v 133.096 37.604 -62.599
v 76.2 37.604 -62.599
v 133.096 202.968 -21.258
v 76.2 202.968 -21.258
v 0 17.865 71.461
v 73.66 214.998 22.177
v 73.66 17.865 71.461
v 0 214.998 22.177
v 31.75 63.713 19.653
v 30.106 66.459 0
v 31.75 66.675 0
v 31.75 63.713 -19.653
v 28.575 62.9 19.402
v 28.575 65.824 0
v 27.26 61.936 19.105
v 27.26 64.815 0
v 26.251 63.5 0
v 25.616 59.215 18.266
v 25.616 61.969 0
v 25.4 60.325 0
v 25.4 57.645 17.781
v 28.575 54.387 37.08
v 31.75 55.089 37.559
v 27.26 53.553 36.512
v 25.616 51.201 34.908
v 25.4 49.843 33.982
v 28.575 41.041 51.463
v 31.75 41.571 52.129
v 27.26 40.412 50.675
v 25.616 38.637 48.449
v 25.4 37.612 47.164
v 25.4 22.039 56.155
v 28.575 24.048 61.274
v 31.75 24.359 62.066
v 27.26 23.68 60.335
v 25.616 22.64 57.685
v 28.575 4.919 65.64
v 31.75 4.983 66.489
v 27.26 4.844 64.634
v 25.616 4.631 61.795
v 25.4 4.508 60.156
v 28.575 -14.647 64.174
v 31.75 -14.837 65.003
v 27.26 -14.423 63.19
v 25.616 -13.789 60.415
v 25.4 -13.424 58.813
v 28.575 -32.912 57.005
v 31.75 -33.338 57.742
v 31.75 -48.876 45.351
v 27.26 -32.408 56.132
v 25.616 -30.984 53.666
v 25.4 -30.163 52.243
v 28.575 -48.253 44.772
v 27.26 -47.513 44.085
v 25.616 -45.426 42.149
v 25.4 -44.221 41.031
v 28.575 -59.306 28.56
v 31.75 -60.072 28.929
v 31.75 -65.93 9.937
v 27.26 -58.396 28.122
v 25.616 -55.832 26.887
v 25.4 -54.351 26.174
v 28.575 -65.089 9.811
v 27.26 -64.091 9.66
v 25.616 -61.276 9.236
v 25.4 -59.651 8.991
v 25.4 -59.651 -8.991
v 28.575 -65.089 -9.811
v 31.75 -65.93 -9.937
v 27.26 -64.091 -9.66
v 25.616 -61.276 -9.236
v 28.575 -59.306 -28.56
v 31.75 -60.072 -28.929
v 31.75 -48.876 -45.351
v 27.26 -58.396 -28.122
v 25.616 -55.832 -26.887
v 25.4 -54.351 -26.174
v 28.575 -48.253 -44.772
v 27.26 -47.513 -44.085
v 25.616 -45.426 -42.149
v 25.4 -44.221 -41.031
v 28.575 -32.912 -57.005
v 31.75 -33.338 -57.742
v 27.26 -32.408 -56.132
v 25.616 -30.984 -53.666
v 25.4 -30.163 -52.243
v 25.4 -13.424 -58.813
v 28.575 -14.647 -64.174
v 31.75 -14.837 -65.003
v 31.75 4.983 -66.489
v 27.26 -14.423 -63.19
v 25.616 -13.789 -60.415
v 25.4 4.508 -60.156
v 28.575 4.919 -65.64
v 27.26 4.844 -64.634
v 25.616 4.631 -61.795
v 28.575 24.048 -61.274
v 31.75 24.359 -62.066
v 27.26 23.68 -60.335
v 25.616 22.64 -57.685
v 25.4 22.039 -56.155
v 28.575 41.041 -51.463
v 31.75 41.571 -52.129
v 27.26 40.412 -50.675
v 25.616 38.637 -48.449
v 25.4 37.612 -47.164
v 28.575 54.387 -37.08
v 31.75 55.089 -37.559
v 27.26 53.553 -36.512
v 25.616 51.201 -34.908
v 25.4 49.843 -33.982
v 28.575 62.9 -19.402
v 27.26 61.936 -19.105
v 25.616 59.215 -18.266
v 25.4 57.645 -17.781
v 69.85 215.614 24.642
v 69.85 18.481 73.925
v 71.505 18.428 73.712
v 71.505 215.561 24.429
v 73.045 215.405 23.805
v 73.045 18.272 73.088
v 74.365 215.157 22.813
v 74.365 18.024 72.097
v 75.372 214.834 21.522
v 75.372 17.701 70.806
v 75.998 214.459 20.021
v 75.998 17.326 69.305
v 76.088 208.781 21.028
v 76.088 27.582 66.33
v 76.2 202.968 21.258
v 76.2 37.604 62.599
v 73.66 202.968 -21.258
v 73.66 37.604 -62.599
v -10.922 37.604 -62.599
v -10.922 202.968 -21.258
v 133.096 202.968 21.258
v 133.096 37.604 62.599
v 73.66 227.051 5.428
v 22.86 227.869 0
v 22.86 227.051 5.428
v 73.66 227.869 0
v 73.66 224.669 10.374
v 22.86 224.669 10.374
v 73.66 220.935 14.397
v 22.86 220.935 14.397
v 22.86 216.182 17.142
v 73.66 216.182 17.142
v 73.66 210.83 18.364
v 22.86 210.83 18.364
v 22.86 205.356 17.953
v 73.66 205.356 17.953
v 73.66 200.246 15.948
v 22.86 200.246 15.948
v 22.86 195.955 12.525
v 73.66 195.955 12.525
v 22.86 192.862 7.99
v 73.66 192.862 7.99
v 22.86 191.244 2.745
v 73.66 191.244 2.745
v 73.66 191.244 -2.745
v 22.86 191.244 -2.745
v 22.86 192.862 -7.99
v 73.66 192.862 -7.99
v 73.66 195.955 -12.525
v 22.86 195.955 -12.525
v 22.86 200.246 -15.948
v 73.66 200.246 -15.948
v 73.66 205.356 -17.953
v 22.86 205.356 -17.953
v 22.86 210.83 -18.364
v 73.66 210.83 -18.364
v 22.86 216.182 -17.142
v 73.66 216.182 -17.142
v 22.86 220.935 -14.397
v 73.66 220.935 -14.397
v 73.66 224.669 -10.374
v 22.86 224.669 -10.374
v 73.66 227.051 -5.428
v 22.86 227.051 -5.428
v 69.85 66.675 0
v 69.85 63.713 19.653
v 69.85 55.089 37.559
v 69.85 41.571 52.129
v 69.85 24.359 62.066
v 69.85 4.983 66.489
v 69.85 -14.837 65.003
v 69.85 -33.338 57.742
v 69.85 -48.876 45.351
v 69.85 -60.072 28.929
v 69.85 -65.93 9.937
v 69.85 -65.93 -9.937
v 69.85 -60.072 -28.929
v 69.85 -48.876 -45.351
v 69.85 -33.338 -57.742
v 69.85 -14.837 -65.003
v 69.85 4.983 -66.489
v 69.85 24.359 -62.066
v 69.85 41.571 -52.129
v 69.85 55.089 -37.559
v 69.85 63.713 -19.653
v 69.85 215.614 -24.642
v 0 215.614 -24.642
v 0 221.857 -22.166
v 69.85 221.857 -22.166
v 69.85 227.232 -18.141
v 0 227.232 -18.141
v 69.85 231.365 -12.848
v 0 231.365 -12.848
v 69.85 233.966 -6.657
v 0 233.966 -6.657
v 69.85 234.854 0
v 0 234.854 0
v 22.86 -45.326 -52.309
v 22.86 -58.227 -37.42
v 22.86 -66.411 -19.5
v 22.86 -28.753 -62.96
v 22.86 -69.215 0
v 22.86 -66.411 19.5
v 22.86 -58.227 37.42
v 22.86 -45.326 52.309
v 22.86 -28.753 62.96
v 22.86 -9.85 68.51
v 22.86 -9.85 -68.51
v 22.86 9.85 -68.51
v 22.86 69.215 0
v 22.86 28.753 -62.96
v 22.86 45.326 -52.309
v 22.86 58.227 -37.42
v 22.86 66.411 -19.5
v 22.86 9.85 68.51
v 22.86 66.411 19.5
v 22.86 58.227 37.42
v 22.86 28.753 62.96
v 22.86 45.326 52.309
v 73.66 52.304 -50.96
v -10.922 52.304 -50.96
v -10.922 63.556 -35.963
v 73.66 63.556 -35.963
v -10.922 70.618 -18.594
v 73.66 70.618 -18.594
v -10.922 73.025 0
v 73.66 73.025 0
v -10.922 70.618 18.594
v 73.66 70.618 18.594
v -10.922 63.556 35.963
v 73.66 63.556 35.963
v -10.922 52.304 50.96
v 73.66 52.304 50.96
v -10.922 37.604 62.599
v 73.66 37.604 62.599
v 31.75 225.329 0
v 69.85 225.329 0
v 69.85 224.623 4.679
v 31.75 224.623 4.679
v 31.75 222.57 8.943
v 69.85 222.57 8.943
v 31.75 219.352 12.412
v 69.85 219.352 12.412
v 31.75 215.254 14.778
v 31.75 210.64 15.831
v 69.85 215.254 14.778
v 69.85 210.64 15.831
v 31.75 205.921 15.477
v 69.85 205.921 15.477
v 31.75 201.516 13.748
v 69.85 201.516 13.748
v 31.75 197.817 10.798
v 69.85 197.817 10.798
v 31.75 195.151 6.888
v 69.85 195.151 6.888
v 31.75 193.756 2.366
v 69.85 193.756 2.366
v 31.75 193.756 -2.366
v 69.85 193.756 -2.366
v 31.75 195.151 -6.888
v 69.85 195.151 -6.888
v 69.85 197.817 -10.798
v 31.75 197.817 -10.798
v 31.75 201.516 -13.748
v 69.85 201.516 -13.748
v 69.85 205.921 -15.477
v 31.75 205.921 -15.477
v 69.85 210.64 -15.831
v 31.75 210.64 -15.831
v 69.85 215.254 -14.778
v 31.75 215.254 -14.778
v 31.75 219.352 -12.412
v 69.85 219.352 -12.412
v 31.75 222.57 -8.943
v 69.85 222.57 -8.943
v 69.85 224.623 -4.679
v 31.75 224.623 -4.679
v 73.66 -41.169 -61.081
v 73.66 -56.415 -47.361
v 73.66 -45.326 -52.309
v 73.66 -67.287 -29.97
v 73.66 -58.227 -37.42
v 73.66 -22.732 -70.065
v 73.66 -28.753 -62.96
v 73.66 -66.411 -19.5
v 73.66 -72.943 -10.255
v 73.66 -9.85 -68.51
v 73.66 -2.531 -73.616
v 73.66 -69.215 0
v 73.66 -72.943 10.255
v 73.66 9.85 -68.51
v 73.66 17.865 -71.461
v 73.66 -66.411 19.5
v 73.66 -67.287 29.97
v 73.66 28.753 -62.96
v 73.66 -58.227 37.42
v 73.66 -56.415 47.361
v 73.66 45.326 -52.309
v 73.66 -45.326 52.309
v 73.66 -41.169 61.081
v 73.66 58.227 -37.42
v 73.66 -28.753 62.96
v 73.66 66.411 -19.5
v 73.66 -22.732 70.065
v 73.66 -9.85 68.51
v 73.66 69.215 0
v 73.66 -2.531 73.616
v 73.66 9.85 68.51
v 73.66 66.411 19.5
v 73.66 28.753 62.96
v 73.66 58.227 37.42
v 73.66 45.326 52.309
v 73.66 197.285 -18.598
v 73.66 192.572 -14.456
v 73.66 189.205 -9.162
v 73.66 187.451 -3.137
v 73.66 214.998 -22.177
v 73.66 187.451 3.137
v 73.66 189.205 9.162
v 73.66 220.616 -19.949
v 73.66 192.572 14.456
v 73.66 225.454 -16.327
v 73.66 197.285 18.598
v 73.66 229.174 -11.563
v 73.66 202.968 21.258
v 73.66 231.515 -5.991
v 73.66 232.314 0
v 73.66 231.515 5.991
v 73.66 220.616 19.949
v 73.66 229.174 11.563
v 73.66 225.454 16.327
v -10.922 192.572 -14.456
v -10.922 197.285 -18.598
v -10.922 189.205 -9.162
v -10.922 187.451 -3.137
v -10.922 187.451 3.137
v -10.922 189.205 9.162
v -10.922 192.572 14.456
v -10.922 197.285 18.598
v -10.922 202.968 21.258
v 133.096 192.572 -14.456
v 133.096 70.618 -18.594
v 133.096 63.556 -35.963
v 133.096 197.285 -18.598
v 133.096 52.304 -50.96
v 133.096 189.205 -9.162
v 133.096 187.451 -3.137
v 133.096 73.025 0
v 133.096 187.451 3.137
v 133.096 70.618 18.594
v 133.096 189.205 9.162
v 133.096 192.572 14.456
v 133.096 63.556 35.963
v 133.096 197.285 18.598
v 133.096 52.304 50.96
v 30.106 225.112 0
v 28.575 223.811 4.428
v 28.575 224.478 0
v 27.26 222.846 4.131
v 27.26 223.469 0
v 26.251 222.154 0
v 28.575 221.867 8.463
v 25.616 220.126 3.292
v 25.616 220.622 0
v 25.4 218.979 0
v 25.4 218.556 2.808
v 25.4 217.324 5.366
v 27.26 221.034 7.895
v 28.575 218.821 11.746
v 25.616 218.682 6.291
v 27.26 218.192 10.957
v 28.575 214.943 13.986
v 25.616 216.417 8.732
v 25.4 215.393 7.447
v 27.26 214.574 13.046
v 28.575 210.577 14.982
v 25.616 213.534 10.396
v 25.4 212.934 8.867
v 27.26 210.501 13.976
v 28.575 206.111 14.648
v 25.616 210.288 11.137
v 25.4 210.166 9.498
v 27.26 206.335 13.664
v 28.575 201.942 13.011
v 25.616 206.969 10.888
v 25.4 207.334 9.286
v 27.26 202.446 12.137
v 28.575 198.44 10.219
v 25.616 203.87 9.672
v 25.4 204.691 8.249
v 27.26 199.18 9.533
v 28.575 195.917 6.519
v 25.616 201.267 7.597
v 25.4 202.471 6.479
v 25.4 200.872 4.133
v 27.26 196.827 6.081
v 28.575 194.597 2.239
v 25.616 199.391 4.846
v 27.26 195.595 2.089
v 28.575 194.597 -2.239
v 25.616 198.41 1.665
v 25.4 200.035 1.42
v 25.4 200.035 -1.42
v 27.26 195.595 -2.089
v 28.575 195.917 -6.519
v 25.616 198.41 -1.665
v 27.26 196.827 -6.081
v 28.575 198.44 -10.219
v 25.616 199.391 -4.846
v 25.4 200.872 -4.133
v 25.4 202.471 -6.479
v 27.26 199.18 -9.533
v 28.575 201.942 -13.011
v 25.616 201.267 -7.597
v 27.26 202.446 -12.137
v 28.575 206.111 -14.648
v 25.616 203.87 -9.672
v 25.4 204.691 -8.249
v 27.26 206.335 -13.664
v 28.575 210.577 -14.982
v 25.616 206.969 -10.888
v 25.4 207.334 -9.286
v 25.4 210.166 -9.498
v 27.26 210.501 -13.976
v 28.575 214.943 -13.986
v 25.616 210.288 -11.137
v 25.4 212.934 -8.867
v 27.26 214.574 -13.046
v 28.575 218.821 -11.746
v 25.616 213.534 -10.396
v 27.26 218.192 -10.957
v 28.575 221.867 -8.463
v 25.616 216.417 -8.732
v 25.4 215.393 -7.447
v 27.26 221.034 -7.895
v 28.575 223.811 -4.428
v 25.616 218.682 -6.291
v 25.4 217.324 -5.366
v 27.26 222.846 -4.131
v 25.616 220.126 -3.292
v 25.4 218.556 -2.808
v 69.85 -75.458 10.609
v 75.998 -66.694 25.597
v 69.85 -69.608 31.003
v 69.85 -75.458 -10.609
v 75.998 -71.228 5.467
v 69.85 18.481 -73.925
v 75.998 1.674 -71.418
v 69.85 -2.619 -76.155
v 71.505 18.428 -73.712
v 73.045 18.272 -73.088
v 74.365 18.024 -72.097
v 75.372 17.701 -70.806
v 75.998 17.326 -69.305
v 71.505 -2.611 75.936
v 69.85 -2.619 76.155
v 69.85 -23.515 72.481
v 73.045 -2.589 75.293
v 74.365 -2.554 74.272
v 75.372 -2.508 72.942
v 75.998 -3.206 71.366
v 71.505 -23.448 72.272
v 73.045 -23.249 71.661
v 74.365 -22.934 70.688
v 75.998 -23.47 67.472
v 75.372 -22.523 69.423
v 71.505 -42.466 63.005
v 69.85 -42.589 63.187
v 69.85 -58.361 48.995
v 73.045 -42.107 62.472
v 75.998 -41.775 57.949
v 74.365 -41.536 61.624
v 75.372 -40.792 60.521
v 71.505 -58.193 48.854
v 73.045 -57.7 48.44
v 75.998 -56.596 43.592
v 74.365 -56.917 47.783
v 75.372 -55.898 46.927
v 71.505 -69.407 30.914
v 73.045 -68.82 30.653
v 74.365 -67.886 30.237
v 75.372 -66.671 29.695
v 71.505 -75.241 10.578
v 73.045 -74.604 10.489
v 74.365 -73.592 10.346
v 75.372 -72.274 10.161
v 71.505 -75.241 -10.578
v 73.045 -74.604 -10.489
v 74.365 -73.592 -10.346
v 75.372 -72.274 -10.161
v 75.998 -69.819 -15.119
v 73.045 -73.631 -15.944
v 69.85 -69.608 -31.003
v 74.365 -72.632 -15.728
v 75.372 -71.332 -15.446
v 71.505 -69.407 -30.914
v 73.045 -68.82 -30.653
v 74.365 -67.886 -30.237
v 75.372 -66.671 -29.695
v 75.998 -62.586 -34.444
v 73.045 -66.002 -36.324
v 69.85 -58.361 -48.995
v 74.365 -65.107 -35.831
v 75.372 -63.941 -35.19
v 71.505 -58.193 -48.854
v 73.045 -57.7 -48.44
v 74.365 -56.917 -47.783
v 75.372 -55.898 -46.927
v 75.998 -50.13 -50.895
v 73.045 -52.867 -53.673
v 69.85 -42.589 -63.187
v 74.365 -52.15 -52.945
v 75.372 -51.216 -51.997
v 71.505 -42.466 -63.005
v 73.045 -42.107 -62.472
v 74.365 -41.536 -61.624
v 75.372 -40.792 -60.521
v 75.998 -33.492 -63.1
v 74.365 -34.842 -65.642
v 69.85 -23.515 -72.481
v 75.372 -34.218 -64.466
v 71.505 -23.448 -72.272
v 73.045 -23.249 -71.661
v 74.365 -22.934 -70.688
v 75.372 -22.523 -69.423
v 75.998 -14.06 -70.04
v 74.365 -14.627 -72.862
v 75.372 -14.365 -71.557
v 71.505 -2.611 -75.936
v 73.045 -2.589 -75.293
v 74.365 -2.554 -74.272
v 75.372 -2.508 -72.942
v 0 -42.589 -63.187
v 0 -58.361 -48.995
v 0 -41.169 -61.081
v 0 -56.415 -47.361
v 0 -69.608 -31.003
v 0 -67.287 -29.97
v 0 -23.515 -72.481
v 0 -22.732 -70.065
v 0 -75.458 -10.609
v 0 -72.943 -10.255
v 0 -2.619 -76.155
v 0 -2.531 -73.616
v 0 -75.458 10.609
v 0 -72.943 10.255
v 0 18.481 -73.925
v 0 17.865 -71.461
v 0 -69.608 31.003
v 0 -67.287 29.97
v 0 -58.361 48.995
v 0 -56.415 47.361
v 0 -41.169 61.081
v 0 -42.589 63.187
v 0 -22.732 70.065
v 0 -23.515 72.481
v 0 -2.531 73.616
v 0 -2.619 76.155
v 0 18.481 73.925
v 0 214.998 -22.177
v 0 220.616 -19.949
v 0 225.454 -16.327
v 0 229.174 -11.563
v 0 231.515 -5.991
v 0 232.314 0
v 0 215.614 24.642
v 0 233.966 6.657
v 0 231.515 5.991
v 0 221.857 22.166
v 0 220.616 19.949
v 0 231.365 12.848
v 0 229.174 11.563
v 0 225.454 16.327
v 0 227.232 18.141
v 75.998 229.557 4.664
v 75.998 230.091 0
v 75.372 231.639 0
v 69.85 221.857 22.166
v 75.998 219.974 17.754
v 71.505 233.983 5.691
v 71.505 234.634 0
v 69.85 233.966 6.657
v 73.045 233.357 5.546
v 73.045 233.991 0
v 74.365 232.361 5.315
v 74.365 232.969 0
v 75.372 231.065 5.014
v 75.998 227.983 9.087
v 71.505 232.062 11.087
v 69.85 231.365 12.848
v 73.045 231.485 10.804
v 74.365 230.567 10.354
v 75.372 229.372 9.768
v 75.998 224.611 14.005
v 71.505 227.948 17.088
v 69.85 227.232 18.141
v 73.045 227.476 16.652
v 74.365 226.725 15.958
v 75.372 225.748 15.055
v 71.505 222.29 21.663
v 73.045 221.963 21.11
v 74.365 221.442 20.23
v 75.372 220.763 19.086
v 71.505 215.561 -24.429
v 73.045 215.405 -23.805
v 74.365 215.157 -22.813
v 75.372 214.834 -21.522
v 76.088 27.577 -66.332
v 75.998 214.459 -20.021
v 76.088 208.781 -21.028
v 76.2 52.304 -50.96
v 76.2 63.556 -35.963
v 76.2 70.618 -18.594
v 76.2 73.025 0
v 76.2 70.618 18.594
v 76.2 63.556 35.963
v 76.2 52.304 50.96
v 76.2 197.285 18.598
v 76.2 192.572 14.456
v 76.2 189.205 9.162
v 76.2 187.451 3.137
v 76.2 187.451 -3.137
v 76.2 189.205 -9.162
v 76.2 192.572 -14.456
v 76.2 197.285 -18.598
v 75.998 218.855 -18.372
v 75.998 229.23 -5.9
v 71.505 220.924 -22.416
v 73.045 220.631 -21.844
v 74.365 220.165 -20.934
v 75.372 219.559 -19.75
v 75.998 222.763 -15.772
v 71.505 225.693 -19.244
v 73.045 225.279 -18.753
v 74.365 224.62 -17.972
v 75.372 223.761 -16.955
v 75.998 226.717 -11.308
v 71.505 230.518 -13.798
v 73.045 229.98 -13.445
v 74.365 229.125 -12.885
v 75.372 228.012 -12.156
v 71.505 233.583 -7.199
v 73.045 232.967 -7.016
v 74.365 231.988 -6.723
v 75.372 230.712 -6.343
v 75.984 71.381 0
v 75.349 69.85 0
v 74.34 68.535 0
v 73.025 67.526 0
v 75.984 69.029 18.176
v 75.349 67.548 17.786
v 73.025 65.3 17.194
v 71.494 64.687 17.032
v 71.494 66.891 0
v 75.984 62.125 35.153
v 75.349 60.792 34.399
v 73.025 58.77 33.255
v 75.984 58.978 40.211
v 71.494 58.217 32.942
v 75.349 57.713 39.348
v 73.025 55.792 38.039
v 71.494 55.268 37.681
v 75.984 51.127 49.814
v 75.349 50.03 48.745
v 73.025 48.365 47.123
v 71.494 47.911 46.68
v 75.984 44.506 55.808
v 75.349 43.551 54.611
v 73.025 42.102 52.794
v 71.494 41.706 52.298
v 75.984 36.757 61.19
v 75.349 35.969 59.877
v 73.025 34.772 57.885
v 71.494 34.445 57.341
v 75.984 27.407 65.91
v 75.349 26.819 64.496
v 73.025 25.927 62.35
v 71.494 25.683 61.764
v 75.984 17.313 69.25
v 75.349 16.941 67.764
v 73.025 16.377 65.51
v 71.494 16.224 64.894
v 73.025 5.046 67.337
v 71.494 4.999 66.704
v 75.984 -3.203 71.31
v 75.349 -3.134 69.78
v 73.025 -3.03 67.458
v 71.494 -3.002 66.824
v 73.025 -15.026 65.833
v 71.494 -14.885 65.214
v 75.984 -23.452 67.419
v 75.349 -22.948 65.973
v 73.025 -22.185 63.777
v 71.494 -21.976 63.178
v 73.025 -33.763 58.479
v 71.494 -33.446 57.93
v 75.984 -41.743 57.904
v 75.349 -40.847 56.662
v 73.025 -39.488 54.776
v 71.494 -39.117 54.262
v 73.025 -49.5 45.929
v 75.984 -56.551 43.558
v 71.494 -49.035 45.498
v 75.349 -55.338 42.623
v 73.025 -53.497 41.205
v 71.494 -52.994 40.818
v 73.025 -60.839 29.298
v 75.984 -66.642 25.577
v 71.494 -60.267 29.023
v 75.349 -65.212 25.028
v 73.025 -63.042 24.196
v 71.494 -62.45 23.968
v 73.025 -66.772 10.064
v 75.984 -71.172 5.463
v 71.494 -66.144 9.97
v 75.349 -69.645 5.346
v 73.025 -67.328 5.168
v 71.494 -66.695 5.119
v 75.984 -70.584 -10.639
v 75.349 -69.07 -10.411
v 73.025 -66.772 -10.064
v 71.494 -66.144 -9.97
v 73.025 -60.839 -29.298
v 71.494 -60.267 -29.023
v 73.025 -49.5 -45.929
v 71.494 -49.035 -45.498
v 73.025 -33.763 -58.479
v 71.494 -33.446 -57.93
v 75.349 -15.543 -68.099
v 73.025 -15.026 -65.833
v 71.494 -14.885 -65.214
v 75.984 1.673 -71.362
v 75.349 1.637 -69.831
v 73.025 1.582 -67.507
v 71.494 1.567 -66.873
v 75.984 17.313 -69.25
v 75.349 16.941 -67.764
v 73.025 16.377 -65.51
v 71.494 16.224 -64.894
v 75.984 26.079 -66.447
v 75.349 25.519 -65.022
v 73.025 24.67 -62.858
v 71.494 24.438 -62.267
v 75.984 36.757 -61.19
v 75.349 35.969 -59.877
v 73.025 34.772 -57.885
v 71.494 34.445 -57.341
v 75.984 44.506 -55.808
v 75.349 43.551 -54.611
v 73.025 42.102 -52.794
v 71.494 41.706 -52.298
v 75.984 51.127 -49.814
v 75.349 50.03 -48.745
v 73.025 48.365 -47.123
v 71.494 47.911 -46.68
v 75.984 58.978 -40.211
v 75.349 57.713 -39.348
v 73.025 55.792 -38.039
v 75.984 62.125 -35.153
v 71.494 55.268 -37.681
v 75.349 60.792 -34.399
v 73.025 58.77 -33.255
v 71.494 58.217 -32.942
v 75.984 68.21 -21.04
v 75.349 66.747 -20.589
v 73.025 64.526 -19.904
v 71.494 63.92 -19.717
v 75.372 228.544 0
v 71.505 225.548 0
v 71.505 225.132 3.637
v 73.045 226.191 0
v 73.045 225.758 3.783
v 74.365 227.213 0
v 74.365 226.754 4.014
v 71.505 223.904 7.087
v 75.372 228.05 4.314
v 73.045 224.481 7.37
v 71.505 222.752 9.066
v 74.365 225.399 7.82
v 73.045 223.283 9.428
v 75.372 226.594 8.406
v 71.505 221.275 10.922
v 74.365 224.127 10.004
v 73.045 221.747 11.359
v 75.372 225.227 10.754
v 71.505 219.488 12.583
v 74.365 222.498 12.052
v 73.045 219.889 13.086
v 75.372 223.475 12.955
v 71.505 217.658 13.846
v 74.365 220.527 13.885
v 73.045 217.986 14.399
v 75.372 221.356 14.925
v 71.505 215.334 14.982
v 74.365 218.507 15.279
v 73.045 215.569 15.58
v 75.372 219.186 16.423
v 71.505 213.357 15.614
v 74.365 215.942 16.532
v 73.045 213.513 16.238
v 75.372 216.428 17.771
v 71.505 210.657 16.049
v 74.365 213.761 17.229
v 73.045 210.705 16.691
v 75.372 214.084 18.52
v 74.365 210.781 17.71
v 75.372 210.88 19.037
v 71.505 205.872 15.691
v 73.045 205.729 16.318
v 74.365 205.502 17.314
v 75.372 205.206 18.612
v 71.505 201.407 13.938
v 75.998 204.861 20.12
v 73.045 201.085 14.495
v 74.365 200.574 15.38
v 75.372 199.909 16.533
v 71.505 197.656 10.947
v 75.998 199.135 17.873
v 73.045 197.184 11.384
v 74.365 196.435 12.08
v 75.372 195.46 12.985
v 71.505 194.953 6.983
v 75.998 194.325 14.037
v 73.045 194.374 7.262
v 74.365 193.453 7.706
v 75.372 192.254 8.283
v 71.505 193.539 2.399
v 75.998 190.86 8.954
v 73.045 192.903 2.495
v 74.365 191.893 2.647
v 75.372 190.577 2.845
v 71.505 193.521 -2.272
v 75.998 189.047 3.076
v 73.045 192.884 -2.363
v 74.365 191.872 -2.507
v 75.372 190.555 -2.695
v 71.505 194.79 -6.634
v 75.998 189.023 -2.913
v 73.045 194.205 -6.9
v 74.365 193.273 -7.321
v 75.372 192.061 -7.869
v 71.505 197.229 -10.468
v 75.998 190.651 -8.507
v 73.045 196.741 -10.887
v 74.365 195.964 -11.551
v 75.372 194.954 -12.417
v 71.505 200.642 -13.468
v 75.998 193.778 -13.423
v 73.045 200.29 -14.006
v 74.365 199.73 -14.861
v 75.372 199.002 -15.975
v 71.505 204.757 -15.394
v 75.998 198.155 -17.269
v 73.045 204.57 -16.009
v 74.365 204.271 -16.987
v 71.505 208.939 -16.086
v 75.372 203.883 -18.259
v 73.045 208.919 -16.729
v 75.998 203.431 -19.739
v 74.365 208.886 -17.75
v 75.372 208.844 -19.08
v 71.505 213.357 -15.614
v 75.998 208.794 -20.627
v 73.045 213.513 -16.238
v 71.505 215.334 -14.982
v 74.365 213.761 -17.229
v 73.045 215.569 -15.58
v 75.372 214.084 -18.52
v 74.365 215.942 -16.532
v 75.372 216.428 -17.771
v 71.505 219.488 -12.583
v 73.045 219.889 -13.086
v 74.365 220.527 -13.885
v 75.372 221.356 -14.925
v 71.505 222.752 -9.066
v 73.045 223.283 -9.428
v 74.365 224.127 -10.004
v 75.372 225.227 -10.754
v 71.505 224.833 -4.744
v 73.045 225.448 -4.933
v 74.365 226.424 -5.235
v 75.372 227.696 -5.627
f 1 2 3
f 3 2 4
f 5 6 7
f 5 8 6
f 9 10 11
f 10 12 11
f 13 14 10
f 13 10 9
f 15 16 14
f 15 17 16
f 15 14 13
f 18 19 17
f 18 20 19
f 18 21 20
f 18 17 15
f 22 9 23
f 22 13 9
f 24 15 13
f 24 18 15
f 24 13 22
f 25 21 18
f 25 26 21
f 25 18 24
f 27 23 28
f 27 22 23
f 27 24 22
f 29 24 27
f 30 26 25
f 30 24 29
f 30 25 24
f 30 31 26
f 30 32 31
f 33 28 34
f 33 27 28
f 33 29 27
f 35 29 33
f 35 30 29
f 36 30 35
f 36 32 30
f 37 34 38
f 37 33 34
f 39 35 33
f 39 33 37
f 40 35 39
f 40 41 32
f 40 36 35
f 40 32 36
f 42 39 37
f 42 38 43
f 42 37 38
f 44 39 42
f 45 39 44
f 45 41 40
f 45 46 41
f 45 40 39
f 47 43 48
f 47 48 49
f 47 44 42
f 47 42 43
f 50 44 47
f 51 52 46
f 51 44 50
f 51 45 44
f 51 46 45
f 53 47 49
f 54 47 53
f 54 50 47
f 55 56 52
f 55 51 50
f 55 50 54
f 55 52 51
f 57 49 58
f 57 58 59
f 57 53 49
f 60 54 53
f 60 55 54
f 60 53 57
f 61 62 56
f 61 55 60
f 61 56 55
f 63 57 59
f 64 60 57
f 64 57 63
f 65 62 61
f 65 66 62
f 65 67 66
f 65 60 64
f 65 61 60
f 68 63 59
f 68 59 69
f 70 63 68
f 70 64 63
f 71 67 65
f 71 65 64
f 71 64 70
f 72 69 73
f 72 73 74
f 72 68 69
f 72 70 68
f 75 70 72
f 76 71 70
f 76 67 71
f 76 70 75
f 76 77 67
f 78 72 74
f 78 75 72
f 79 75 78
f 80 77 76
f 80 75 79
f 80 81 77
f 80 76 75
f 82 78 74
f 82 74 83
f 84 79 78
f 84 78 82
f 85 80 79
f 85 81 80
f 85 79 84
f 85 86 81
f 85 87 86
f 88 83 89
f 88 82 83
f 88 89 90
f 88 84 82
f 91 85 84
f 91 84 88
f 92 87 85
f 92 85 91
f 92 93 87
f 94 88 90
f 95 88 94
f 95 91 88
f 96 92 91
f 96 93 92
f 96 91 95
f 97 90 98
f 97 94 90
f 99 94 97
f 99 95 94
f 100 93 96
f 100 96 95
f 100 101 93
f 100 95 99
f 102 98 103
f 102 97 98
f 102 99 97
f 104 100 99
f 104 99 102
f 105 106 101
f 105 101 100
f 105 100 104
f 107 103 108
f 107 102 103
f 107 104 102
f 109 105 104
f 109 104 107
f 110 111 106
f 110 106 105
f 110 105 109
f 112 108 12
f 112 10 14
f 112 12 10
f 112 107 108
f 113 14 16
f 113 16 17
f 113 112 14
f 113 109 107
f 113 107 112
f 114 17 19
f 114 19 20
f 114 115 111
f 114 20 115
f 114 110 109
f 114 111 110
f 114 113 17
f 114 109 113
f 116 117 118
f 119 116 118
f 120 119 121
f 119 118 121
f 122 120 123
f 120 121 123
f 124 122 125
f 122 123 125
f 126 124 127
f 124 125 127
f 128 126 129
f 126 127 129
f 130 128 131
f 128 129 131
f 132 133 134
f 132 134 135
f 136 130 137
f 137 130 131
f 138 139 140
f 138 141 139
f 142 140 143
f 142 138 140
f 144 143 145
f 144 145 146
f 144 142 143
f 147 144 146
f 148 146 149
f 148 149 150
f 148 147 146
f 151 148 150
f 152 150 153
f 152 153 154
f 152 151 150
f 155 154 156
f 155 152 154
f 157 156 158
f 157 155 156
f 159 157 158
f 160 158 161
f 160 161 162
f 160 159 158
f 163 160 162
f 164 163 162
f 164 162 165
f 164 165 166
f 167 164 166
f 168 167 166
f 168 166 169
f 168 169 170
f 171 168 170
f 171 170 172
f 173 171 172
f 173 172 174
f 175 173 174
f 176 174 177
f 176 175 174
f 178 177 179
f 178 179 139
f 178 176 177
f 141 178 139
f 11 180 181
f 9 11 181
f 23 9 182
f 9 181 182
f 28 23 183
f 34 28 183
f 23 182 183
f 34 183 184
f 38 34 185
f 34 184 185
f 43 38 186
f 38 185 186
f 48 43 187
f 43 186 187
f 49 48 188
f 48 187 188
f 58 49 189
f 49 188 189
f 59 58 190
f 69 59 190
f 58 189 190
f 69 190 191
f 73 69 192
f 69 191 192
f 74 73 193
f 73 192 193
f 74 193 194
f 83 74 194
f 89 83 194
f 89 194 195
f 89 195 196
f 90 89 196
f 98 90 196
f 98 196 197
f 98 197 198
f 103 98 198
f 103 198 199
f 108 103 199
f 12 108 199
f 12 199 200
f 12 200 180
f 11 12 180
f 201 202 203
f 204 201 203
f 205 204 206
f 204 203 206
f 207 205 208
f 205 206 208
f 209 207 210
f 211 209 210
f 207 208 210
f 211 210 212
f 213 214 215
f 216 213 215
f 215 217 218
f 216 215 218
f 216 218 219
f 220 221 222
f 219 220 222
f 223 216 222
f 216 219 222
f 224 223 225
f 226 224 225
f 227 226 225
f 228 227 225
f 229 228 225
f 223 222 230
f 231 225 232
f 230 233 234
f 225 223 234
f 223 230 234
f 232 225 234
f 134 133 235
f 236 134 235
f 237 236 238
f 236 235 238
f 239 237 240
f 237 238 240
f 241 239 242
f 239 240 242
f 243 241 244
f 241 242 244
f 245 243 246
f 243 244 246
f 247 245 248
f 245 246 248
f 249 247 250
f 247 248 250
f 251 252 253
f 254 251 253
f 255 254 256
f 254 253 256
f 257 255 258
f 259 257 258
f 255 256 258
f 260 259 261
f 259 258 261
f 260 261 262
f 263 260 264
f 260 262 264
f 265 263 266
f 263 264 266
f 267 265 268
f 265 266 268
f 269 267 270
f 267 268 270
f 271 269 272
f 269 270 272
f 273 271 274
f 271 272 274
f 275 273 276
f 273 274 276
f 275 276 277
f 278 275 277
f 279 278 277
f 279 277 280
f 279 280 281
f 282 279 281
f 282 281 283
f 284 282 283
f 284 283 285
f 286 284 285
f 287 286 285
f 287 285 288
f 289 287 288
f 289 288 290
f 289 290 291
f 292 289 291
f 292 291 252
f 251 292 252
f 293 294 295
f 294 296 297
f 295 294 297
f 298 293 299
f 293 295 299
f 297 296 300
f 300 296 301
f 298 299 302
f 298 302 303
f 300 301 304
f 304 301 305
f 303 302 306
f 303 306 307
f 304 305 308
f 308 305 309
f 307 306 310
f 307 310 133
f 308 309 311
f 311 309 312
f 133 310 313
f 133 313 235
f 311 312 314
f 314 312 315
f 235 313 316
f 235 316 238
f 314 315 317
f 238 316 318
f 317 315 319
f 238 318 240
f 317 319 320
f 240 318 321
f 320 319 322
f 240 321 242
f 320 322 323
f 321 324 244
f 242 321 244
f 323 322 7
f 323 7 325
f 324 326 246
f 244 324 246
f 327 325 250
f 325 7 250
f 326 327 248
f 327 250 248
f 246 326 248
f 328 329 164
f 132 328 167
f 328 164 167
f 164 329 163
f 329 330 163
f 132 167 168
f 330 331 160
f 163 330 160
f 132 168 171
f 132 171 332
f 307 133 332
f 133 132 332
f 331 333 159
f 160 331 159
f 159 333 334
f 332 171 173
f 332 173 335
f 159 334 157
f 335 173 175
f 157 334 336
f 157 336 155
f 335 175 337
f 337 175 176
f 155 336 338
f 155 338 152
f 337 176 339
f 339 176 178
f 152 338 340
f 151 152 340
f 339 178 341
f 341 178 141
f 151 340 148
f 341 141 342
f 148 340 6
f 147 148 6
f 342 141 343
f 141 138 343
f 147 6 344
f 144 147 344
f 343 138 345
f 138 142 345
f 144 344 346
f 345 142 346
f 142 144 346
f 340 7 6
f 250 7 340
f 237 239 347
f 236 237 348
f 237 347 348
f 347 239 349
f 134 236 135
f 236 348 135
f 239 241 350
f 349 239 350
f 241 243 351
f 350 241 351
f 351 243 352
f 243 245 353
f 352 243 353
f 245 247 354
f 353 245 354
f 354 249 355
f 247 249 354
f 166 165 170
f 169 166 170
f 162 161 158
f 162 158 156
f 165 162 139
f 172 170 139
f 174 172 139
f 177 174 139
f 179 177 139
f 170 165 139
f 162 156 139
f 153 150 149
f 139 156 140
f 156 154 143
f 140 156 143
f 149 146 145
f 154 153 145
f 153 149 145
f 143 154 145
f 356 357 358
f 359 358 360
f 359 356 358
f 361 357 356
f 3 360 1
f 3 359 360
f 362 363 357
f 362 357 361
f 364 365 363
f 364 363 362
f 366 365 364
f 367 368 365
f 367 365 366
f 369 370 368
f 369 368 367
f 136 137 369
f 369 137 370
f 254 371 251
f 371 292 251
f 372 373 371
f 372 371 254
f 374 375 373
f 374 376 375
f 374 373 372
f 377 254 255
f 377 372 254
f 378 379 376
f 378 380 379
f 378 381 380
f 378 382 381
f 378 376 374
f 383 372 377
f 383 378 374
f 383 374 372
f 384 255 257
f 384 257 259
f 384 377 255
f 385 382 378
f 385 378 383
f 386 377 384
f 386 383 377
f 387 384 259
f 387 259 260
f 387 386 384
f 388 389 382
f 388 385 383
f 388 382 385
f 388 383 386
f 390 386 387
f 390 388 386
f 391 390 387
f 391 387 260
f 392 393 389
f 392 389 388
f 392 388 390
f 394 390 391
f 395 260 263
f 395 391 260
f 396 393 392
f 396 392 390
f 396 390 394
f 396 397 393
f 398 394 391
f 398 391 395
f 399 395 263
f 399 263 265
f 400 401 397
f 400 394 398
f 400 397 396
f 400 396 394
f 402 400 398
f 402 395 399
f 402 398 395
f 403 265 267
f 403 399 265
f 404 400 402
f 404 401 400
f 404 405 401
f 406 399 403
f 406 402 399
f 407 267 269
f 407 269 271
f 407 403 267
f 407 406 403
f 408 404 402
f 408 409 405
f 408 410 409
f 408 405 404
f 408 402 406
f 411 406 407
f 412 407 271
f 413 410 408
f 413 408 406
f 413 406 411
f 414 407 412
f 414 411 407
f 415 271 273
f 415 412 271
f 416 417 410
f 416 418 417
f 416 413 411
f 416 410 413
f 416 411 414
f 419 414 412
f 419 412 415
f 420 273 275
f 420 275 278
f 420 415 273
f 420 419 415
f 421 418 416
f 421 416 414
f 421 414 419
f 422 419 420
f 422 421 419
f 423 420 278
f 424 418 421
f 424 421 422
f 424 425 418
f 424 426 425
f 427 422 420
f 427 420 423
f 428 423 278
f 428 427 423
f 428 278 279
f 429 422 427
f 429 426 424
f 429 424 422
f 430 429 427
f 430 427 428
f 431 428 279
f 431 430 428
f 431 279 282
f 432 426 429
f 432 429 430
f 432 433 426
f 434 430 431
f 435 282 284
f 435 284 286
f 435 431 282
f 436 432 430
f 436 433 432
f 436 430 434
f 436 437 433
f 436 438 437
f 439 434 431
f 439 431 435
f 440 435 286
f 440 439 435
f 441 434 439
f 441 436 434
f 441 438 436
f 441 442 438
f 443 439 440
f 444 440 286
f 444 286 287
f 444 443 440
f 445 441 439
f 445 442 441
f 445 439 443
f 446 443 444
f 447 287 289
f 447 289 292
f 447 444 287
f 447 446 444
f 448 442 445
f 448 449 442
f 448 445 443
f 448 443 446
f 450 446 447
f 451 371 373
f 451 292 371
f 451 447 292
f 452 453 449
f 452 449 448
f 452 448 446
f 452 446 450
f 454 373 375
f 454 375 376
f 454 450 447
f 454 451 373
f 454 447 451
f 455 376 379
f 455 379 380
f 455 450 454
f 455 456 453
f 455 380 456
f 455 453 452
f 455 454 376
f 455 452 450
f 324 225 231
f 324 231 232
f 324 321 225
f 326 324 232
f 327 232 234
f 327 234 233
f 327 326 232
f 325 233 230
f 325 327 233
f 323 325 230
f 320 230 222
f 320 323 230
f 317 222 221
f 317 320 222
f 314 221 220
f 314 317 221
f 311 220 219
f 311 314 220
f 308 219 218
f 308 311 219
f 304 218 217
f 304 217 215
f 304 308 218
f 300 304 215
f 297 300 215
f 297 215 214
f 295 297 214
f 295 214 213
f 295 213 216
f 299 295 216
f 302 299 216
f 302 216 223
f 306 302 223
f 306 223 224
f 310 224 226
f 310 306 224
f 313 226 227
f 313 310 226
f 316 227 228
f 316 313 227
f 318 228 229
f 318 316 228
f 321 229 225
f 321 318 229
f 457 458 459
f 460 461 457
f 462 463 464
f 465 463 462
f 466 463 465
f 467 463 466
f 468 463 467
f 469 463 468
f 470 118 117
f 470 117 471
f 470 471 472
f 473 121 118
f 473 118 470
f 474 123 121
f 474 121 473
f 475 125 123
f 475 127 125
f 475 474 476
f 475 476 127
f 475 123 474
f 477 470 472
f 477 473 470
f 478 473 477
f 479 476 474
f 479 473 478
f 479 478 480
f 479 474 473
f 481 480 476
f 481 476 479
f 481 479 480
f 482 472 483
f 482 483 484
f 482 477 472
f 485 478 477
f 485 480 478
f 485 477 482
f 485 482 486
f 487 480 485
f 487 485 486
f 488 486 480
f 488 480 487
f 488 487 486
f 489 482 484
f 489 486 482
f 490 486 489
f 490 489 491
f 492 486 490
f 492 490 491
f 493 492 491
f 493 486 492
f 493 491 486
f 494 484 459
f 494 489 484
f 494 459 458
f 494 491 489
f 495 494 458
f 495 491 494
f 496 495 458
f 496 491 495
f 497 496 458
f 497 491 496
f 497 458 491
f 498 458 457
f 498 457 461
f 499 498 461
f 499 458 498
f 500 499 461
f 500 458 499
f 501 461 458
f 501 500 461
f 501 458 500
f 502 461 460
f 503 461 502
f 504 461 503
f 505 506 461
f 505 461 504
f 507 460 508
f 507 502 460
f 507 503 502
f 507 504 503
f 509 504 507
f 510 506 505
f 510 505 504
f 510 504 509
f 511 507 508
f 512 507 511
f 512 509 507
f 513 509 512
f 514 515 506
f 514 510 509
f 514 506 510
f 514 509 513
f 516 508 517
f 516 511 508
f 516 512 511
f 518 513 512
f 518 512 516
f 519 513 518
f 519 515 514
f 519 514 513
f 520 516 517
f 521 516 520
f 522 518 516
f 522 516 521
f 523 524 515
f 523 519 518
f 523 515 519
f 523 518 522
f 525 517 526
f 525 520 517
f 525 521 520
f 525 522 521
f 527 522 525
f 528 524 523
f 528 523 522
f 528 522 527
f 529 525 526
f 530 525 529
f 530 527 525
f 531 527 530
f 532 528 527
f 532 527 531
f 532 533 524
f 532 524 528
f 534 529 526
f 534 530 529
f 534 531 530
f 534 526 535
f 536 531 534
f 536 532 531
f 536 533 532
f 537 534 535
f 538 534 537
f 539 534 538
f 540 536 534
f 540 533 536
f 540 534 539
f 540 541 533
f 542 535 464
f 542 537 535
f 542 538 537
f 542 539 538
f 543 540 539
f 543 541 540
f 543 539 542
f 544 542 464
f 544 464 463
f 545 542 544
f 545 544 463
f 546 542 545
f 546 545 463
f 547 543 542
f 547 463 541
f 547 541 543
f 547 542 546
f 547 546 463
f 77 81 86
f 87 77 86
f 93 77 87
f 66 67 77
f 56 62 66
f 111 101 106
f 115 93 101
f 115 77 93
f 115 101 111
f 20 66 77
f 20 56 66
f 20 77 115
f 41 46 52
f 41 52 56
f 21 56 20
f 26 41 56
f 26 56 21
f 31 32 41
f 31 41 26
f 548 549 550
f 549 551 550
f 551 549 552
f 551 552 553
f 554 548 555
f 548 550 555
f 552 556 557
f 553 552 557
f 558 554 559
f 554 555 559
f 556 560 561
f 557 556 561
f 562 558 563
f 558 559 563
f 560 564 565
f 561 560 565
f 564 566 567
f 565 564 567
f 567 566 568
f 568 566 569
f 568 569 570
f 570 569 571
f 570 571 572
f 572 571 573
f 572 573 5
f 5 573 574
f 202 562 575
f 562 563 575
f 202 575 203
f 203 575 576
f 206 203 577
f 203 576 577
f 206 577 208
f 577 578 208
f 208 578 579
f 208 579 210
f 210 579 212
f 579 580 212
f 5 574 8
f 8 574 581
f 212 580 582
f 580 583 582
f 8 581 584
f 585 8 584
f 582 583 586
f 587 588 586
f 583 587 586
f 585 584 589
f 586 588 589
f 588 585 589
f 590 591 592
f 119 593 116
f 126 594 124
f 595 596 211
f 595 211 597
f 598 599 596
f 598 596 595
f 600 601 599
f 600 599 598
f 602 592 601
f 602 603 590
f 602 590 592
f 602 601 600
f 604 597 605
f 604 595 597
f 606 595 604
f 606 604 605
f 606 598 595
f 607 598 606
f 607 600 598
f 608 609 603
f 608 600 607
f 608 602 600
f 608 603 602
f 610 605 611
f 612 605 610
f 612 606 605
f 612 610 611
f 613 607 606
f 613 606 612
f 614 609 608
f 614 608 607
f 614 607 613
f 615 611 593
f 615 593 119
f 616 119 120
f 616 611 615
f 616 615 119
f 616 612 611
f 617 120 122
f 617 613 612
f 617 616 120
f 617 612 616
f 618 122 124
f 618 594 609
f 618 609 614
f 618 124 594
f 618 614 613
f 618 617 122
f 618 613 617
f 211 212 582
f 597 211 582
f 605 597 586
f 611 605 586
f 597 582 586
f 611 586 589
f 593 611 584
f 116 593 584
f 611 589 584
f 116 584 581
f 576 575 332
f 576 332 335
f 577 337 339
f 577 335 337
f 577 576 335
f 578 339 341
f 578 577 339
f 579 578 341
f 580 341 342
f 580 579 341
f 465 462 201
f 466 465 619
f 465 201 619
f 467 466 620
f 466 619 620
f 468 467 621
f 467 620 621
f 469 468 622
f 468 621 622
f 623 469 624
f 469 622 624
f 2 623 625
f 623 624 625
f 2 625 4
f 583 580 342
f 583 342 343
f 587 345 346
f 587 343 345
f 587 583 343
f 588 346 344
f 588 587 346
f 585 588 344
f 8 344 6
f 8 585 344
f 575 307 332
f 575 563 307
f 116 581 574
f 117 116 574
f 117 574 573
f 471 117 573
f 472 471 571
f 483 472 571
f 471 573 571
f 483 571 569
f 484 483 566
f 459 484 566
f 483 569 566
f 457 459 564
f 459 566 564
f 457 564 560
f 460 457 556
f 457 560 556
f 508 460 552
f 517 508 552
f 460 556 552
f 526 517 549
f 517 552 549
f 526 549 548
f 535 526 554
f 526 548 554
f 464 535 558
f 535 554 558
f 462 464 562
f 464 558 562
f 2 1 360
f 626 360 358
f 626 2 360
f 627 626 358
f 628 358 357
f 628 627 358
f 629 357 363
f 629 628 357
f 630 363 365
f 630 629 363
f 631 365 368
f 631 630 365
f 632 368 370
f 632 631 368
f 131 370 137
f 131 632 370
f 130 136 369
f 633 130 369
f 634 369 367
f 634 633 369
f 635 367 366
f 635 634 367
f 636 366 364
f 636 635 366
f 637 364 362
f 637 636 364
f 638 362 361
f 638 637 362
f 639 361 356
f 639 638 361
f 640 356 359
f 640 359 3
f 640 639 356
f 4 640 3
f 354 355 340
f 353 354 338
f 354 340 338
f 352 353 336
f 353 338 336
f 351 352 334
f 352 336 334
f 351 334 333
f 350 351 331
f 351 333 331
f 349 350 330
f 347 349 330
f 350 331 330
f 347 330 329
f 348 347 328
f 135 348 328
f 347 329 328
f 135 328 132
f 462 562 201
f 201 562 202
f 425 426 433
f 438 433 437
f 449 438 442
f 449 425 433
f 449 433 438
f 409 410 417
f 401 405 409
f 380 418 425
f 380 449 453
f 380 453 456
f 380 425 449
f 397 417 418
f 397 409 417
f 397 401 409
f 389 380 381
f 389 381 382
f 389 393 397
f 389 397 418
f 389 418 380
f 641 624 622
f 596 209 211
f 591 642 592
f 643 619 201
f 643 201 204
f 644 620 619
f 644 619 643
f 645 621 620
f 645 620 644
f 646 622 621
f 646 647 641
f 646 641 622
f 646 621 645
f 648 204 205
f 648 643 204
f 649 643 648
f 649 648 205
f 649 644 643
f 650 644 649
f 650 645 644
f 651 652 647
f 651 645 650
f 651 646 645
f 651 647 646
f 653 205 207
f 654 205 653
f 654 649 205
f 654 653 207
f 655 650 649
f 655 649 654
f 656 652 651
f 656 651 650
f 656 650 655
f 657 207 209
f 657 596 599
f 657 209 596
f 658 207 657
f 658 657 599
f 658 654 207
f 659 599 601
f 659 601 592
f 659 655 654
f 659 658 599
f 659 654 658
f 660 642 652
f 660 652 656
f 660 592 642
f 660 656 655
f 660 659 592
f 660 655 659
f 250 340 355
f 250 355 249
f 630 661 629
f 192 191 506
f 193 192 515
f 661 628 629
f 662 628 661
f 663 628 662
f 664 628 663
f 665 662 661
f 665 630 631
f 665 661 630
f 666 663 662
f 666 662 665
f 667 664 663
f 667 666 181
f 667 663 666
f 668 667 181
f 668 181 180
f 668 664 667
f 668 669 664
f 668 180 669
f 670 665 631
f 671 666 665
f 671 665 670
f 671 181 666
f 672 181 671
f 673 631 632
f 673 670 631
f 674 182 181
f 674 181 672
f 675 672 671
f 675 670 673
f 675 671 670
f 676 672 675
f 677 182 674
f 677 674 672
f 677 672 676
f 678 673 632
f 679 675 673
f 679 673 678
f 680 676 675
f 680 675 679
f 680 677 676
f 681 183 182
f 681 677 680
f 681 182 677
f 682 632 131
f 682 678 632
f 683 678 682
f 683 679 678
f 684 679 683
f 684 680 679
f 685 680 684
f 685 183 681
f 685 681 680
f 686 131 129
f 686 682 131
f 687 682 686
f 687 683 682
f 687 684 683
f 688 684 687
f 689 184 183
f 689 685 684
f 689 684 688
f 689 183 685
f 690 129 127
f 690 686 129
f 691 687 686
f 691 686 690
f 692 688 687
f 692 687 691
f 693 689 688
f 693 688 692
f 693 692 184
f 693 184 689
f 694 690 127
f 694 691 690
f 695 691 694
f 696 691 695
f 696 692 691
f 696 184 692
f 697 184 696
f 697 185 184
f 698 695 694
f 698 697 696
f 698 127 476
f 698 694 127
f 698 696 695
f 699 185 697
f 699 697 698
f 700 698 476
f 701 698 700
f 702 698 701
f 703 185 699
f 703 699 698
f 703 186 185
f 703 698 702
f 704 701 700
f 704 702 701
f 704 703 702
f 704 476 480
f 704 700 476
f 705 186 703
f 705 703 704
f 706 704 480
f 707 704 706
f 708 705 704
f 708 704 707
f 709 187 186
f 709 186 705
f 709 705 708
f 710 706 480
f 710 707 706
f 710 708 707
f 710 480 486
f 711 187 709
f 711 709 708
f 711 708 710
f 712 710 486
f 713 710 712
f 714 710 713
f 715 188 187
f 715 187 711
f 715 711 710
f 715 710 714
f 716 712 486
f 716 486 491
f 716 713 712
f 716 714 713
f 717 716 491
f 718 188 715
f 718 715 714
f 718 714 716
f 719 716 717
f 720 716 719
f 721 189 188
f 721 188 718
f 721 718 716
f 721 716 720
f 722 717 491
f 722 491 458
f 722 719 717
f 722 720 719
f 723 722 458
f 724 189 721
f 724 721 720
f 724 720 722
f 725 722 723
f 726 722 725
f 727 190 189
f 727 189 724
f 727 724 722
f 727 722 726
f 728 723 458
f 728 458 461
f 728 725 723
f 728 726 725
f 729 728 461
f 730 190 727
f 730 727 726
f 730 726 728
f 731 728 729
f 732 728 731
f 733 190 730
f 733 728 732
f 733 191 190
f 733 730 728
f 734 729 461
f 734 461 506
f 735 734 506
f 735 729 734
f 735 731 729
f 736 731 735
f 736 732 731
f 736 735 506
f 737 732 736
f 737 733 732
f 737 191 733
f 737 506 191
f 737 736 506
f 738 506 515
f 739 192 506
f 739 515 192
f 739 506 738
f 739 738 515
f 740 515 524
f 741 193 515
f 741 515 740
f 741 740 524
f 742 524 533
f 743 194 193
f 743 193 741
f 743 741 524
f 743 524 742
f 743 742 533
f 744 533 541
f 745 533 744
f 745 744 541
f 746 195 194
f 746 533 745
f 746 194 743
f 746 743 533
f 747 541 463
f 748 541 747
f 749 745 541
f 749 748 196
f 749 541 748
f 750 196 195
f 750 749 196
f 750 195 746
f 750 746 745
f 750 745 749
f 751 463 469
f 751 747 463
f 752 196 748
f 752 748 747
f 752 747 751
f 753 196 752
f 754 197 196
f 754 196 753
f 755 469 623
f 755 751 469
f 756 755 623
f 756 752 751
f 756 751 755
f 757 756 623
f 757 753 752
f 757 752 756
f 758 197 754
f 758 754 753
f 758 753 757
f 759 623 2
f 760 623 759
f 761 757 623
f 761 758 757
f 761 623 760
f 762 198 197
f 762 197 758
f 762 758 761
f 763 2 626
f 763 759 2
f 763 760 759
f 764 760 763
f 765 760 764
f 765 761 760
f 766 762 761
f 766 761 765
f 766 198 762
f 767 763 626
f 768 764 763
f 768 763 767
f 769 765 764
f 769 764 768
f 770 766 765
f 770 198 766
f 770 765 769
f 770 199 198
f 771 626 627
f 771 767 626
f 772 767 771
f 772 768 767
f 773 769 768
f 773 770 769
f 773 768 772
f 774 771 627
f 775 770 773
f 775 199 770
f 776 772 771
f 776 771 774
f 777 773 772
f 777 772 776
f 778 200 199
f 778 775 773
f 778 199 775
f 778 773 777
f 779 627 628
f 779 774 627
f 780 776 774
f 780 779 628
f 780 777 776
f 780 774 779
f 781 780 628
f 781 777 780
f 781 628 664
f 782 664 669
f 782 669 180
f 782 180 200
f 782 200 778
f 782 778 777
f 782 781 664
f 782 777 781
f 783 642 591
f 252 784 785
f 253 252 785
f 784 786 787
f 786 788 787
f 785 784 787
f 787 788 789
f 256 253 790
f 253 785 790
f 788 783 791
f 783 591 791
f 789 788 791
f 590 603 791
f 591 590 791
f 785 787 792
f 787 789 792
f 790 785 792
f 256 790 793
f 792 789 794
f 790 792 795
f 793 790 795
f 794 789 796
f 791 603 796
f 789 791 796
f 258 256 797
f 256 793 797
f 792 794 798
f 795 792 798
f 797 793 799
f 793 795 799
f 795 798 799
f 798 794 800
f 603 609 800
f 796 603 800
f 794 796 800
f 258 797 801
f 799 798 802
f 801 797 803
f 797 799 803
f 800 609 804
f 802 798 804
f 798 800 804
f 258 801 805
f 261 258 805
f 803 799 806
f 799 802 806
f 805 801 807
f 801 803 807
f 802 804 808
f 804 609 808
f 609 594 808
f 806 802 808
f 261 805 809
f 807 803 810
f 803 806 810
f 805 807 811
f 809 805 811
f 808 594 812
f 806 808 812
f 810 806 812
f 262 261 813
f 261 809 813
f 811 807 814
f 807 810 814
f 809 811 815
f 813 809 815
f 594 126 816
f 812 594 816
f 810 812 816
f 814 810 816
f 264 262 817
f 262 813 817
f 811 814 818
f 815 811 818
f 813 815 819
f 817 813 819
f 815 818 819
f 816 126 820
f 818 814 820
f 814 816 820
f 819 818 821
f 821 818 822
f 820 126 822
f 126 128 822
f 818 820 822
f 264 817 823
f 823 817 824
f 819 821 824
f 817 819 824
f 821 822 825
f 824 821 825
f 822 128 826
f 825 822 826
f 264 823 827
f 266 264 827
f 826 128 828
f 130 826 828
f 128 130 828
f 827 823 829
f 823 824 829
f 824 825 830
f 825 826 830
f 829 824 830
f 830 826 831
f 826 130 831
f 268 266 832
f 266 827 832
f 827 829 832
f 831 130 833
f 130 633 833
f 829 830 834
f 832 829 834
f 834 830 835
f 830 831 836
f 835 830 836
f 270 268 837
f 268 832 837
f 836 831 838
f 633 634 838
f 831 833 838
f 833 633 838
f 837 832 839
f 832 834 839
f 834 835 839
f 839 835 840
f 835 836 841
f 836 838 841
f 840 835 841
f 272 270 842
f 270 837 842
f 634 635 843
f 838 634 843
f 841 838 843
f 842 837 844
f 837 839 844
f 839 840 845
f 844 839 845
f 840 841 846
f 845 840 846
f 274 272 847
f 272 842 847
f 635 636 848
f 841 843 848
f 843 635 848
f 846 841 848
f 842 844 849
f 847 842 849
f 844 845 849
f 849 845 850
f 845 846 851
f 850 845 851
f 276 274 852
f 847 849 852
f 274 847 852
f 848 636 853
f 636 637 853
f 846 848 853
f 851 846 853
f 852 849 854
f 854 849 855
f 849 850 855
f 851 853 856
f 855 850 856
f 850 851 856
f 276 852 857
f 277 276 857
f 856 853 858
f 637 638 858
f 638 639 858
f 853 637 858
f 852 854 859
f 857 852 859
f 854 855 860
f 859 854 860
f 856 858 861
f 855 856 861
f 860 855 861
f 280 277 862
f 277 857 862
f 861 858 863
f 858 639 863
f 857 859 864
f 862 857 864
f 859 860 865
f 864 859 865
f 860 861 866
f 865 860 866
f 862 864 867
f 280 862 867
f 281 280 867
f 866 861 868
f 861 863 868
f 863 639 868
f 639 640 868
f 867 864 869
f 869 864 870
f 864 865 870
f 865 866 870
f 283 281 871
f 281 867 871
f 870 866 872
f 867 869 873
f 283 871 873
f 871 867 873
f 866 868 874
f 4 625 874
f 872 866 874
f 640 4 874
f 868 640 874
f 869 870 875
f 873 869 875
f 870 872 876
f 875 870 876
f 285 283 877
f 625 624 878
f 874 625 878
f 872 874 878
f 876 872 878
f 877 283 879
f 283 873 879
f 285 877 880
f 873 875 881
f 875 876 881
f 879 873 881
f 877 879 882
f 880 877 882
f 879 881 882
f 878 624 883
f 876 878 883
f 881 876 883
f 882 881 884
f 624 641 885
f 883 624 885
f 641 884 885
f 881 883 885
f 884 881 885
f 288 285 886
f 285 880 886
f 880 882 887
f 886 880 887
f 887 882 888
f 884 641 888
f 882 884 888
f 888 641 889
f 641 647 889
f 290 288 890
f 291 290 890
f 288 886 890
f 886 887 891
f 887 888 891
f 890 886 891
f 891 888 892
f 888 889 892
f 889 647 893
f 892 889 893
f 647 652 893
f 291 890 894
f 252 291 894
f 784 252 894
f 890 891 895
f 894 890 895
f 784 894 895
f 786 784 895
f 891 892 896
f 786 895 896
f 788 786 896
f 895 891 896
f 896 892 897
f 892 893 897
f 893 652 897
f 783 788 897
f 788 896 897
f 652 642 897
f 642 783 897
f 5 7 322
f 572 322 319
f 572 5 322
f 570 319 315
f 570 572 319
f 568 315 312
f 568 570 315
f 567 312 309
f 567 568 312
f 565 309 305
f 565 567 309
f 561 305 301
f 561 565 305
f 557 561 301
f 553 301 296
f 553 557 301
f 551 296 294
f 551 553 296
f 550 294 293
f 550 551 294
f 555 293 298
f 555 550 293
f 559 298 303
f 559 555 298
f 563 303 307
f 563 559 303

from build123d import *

# Parameters (mm, degrees)
F1_DEPTH = 76.2
F2_R     = 66.675
F2_R_2   = 15.875
F3_DEPTH = 50.8
F4_T     = -2.54
F5_F1_R  = 6.35
F5_F2_R  = 6.35
F5_F3_R  = 6.35
F6_DEPTH = 56.896
F7_DEPTH = 144.018


# Not quite as in the source:
# - a fillet or chamfer that OpenCascade refuses, or shapes differently, is made with other operations: its cross-section is extruded or revolved along the edge and cut away or added


with BuildPart() as f1:
    # F0 (on Right) → F1 (new body)
    with BuildSketch(Plane.YZ):
        with BuildLine():
            ThreePointArc((18.4812146278, -73.9248585111), (60.0612543768, -46.8944103565), (76.2, 0))
            ThreePointArc((76.2, 0), (60.0612543768, 46.8944103565), (18.4812146278, 73.9248585111))
            ThreePointArc((18.4812146278, 73.9248585111), (-76.2, 0), (18.4812146278, -73.9248585111))
        make_face()
        with BuildLine():
            ThreePointArc((18.4812146278, 73.9248585111), (60.0612543768, 46.8944103565), (76.2, 0))
            ThreePointArc((76.2, 0), (60.0612543768, -46.8944103565), (18.4812146278, -73.9248585111))
            Line((18.4812146278, -73.9248585111), (215.6141706573, -24.6416195037))
            ThreePointArc((215.6141706573, -24.6416195037), (184.0537657814, 0), (215.6141706573, 24.6416195037))
            Line((215.6141706573, 24.6416195037), (18.4812146278, 73.9248585111))
        make_face()
        with BuildLine():
            ThreePointArc((234.8537657814, 0), (229.474183907, 15.6314701188), (215.6141706573, 24.6416195037))
            ThreePointArc((215.6141706573, 24.6416195037), (184.0537657814, 0), (215.6141706573, -24.6416195037))
            ThreePointArc((215.6141706573, -24.6416195037), (229.474183907, -15.6314701188), (234.8537657814, 0))
        make_face()
    extrude(amount=F1_DEPTH)

    # F2 (on face) → F3 (cut)
    with BuildSketch(Plane.YZ.offset(76.2)):
        Circle(F2_R)
        with Locations((209.4537657814, 0)):
            Circle(F2_R_2)
    extrude(amount=-F3_DEPTH, mode=Mode.SUBTRACT)

    # F4
    f4_openings = [f1.faces().sort_by_distance(p)[0] for p in [
        (0, 57.51924, 0),
    ]]
    offset(amount=F4_T, openings=f4_openings, kind=Kind.INTERSECTION)

    # F5: fillet of radius 6.35 on 8 edges, made by hand

    # F5_f1
    f5_f1_edges = [f1.edges().sort_by_distance(p)[0] for p in [
        (76.2, -76.2, 0),
        (76.2, 117.0476926425, 49.2832390074),
        (76.2, 117.0476926425, -49.2832390074),
        (76.2, 234.8537657814, 0),
    ]]
    fillet(f5_f1_edges, radius=F5_F1_R)

    # F5_f2
    f5_f2_edges = [f1.edges().sort_by_distance(p)[0] for p in [
        (25.4, -66.675, 0),
    ]]
    fillet(f5_f2_edges, radius=F5_F2_R)

    # F5_f3
    f5_f3_edges = [f1.edges().sort_by_distance(p)[0] for p in [
        (25.4, 193.5787657814, 0),
    ]]
    fillet(f5_f3_edges, radius=F5_F3_R)

    # F5_s4 → F5_t5 (revolve, cut)
    with BuildSketch(Plane.XY):
        with BuildLine():
            ThreePointArc((76.2, 73.025), (74.3401280605, 68.5348719395), (69.85, 66.675))
            Line((69.85, 66.675), (69.85, 66.548))
            Line((69.85, 66.548), (76.327, 66.548))
            Line((76.327, 66.548), (76.327, 73.025))
            Line((76.327, 73.025), (76.2, 73.025))
        make_face()
    revolve(axis=Axis((76.2, 0, 0), (1, 0, 0)), mode=Mode.SUBTRACT)

    # F5_s6 → F5_t7 (revolve, cut)
    with BuildSketch(Plane.XY):
        with BuildLine():
            ThreePointArc((69.85, 225.3287657814), (74.3401280605, 227.1886377208), (76.2, 231.6787657814))
            Line((76.2, 231.6787657814), (76.327, 231.6787657814))
            Line((76.327, 231.6787657814), (76.327, 225.2017657814))
            Line((76.327, 225.2017657814), (69.85, 225.2017657814))
            Line((69.85, 225.2017657814), (69.85, 225.3287657814))
        make_face()
    revolve(axis=Axis((76.2, 209.4537657814, 0), (1, 0, 0)), mode=Mode.SUBTRACT)

    # F6 (add): a face of the model
    f6_faces = [f1.faces().sort_by_distance(p)[0] for p in [
        (76.2, 119.1189366743, 0),
    ]]
    extrude(f6_faces, amount=F6_DEPTH)

    # F7 (add): a face of the model
    f7_faces = [f1.faces().sort_by_distance(p)[0] for p in [
        (133.096, 119.1189366743, 0),
    ]]
    extrude(f7_faces, amount=-F7_DEPTH)


solid = f1.part
